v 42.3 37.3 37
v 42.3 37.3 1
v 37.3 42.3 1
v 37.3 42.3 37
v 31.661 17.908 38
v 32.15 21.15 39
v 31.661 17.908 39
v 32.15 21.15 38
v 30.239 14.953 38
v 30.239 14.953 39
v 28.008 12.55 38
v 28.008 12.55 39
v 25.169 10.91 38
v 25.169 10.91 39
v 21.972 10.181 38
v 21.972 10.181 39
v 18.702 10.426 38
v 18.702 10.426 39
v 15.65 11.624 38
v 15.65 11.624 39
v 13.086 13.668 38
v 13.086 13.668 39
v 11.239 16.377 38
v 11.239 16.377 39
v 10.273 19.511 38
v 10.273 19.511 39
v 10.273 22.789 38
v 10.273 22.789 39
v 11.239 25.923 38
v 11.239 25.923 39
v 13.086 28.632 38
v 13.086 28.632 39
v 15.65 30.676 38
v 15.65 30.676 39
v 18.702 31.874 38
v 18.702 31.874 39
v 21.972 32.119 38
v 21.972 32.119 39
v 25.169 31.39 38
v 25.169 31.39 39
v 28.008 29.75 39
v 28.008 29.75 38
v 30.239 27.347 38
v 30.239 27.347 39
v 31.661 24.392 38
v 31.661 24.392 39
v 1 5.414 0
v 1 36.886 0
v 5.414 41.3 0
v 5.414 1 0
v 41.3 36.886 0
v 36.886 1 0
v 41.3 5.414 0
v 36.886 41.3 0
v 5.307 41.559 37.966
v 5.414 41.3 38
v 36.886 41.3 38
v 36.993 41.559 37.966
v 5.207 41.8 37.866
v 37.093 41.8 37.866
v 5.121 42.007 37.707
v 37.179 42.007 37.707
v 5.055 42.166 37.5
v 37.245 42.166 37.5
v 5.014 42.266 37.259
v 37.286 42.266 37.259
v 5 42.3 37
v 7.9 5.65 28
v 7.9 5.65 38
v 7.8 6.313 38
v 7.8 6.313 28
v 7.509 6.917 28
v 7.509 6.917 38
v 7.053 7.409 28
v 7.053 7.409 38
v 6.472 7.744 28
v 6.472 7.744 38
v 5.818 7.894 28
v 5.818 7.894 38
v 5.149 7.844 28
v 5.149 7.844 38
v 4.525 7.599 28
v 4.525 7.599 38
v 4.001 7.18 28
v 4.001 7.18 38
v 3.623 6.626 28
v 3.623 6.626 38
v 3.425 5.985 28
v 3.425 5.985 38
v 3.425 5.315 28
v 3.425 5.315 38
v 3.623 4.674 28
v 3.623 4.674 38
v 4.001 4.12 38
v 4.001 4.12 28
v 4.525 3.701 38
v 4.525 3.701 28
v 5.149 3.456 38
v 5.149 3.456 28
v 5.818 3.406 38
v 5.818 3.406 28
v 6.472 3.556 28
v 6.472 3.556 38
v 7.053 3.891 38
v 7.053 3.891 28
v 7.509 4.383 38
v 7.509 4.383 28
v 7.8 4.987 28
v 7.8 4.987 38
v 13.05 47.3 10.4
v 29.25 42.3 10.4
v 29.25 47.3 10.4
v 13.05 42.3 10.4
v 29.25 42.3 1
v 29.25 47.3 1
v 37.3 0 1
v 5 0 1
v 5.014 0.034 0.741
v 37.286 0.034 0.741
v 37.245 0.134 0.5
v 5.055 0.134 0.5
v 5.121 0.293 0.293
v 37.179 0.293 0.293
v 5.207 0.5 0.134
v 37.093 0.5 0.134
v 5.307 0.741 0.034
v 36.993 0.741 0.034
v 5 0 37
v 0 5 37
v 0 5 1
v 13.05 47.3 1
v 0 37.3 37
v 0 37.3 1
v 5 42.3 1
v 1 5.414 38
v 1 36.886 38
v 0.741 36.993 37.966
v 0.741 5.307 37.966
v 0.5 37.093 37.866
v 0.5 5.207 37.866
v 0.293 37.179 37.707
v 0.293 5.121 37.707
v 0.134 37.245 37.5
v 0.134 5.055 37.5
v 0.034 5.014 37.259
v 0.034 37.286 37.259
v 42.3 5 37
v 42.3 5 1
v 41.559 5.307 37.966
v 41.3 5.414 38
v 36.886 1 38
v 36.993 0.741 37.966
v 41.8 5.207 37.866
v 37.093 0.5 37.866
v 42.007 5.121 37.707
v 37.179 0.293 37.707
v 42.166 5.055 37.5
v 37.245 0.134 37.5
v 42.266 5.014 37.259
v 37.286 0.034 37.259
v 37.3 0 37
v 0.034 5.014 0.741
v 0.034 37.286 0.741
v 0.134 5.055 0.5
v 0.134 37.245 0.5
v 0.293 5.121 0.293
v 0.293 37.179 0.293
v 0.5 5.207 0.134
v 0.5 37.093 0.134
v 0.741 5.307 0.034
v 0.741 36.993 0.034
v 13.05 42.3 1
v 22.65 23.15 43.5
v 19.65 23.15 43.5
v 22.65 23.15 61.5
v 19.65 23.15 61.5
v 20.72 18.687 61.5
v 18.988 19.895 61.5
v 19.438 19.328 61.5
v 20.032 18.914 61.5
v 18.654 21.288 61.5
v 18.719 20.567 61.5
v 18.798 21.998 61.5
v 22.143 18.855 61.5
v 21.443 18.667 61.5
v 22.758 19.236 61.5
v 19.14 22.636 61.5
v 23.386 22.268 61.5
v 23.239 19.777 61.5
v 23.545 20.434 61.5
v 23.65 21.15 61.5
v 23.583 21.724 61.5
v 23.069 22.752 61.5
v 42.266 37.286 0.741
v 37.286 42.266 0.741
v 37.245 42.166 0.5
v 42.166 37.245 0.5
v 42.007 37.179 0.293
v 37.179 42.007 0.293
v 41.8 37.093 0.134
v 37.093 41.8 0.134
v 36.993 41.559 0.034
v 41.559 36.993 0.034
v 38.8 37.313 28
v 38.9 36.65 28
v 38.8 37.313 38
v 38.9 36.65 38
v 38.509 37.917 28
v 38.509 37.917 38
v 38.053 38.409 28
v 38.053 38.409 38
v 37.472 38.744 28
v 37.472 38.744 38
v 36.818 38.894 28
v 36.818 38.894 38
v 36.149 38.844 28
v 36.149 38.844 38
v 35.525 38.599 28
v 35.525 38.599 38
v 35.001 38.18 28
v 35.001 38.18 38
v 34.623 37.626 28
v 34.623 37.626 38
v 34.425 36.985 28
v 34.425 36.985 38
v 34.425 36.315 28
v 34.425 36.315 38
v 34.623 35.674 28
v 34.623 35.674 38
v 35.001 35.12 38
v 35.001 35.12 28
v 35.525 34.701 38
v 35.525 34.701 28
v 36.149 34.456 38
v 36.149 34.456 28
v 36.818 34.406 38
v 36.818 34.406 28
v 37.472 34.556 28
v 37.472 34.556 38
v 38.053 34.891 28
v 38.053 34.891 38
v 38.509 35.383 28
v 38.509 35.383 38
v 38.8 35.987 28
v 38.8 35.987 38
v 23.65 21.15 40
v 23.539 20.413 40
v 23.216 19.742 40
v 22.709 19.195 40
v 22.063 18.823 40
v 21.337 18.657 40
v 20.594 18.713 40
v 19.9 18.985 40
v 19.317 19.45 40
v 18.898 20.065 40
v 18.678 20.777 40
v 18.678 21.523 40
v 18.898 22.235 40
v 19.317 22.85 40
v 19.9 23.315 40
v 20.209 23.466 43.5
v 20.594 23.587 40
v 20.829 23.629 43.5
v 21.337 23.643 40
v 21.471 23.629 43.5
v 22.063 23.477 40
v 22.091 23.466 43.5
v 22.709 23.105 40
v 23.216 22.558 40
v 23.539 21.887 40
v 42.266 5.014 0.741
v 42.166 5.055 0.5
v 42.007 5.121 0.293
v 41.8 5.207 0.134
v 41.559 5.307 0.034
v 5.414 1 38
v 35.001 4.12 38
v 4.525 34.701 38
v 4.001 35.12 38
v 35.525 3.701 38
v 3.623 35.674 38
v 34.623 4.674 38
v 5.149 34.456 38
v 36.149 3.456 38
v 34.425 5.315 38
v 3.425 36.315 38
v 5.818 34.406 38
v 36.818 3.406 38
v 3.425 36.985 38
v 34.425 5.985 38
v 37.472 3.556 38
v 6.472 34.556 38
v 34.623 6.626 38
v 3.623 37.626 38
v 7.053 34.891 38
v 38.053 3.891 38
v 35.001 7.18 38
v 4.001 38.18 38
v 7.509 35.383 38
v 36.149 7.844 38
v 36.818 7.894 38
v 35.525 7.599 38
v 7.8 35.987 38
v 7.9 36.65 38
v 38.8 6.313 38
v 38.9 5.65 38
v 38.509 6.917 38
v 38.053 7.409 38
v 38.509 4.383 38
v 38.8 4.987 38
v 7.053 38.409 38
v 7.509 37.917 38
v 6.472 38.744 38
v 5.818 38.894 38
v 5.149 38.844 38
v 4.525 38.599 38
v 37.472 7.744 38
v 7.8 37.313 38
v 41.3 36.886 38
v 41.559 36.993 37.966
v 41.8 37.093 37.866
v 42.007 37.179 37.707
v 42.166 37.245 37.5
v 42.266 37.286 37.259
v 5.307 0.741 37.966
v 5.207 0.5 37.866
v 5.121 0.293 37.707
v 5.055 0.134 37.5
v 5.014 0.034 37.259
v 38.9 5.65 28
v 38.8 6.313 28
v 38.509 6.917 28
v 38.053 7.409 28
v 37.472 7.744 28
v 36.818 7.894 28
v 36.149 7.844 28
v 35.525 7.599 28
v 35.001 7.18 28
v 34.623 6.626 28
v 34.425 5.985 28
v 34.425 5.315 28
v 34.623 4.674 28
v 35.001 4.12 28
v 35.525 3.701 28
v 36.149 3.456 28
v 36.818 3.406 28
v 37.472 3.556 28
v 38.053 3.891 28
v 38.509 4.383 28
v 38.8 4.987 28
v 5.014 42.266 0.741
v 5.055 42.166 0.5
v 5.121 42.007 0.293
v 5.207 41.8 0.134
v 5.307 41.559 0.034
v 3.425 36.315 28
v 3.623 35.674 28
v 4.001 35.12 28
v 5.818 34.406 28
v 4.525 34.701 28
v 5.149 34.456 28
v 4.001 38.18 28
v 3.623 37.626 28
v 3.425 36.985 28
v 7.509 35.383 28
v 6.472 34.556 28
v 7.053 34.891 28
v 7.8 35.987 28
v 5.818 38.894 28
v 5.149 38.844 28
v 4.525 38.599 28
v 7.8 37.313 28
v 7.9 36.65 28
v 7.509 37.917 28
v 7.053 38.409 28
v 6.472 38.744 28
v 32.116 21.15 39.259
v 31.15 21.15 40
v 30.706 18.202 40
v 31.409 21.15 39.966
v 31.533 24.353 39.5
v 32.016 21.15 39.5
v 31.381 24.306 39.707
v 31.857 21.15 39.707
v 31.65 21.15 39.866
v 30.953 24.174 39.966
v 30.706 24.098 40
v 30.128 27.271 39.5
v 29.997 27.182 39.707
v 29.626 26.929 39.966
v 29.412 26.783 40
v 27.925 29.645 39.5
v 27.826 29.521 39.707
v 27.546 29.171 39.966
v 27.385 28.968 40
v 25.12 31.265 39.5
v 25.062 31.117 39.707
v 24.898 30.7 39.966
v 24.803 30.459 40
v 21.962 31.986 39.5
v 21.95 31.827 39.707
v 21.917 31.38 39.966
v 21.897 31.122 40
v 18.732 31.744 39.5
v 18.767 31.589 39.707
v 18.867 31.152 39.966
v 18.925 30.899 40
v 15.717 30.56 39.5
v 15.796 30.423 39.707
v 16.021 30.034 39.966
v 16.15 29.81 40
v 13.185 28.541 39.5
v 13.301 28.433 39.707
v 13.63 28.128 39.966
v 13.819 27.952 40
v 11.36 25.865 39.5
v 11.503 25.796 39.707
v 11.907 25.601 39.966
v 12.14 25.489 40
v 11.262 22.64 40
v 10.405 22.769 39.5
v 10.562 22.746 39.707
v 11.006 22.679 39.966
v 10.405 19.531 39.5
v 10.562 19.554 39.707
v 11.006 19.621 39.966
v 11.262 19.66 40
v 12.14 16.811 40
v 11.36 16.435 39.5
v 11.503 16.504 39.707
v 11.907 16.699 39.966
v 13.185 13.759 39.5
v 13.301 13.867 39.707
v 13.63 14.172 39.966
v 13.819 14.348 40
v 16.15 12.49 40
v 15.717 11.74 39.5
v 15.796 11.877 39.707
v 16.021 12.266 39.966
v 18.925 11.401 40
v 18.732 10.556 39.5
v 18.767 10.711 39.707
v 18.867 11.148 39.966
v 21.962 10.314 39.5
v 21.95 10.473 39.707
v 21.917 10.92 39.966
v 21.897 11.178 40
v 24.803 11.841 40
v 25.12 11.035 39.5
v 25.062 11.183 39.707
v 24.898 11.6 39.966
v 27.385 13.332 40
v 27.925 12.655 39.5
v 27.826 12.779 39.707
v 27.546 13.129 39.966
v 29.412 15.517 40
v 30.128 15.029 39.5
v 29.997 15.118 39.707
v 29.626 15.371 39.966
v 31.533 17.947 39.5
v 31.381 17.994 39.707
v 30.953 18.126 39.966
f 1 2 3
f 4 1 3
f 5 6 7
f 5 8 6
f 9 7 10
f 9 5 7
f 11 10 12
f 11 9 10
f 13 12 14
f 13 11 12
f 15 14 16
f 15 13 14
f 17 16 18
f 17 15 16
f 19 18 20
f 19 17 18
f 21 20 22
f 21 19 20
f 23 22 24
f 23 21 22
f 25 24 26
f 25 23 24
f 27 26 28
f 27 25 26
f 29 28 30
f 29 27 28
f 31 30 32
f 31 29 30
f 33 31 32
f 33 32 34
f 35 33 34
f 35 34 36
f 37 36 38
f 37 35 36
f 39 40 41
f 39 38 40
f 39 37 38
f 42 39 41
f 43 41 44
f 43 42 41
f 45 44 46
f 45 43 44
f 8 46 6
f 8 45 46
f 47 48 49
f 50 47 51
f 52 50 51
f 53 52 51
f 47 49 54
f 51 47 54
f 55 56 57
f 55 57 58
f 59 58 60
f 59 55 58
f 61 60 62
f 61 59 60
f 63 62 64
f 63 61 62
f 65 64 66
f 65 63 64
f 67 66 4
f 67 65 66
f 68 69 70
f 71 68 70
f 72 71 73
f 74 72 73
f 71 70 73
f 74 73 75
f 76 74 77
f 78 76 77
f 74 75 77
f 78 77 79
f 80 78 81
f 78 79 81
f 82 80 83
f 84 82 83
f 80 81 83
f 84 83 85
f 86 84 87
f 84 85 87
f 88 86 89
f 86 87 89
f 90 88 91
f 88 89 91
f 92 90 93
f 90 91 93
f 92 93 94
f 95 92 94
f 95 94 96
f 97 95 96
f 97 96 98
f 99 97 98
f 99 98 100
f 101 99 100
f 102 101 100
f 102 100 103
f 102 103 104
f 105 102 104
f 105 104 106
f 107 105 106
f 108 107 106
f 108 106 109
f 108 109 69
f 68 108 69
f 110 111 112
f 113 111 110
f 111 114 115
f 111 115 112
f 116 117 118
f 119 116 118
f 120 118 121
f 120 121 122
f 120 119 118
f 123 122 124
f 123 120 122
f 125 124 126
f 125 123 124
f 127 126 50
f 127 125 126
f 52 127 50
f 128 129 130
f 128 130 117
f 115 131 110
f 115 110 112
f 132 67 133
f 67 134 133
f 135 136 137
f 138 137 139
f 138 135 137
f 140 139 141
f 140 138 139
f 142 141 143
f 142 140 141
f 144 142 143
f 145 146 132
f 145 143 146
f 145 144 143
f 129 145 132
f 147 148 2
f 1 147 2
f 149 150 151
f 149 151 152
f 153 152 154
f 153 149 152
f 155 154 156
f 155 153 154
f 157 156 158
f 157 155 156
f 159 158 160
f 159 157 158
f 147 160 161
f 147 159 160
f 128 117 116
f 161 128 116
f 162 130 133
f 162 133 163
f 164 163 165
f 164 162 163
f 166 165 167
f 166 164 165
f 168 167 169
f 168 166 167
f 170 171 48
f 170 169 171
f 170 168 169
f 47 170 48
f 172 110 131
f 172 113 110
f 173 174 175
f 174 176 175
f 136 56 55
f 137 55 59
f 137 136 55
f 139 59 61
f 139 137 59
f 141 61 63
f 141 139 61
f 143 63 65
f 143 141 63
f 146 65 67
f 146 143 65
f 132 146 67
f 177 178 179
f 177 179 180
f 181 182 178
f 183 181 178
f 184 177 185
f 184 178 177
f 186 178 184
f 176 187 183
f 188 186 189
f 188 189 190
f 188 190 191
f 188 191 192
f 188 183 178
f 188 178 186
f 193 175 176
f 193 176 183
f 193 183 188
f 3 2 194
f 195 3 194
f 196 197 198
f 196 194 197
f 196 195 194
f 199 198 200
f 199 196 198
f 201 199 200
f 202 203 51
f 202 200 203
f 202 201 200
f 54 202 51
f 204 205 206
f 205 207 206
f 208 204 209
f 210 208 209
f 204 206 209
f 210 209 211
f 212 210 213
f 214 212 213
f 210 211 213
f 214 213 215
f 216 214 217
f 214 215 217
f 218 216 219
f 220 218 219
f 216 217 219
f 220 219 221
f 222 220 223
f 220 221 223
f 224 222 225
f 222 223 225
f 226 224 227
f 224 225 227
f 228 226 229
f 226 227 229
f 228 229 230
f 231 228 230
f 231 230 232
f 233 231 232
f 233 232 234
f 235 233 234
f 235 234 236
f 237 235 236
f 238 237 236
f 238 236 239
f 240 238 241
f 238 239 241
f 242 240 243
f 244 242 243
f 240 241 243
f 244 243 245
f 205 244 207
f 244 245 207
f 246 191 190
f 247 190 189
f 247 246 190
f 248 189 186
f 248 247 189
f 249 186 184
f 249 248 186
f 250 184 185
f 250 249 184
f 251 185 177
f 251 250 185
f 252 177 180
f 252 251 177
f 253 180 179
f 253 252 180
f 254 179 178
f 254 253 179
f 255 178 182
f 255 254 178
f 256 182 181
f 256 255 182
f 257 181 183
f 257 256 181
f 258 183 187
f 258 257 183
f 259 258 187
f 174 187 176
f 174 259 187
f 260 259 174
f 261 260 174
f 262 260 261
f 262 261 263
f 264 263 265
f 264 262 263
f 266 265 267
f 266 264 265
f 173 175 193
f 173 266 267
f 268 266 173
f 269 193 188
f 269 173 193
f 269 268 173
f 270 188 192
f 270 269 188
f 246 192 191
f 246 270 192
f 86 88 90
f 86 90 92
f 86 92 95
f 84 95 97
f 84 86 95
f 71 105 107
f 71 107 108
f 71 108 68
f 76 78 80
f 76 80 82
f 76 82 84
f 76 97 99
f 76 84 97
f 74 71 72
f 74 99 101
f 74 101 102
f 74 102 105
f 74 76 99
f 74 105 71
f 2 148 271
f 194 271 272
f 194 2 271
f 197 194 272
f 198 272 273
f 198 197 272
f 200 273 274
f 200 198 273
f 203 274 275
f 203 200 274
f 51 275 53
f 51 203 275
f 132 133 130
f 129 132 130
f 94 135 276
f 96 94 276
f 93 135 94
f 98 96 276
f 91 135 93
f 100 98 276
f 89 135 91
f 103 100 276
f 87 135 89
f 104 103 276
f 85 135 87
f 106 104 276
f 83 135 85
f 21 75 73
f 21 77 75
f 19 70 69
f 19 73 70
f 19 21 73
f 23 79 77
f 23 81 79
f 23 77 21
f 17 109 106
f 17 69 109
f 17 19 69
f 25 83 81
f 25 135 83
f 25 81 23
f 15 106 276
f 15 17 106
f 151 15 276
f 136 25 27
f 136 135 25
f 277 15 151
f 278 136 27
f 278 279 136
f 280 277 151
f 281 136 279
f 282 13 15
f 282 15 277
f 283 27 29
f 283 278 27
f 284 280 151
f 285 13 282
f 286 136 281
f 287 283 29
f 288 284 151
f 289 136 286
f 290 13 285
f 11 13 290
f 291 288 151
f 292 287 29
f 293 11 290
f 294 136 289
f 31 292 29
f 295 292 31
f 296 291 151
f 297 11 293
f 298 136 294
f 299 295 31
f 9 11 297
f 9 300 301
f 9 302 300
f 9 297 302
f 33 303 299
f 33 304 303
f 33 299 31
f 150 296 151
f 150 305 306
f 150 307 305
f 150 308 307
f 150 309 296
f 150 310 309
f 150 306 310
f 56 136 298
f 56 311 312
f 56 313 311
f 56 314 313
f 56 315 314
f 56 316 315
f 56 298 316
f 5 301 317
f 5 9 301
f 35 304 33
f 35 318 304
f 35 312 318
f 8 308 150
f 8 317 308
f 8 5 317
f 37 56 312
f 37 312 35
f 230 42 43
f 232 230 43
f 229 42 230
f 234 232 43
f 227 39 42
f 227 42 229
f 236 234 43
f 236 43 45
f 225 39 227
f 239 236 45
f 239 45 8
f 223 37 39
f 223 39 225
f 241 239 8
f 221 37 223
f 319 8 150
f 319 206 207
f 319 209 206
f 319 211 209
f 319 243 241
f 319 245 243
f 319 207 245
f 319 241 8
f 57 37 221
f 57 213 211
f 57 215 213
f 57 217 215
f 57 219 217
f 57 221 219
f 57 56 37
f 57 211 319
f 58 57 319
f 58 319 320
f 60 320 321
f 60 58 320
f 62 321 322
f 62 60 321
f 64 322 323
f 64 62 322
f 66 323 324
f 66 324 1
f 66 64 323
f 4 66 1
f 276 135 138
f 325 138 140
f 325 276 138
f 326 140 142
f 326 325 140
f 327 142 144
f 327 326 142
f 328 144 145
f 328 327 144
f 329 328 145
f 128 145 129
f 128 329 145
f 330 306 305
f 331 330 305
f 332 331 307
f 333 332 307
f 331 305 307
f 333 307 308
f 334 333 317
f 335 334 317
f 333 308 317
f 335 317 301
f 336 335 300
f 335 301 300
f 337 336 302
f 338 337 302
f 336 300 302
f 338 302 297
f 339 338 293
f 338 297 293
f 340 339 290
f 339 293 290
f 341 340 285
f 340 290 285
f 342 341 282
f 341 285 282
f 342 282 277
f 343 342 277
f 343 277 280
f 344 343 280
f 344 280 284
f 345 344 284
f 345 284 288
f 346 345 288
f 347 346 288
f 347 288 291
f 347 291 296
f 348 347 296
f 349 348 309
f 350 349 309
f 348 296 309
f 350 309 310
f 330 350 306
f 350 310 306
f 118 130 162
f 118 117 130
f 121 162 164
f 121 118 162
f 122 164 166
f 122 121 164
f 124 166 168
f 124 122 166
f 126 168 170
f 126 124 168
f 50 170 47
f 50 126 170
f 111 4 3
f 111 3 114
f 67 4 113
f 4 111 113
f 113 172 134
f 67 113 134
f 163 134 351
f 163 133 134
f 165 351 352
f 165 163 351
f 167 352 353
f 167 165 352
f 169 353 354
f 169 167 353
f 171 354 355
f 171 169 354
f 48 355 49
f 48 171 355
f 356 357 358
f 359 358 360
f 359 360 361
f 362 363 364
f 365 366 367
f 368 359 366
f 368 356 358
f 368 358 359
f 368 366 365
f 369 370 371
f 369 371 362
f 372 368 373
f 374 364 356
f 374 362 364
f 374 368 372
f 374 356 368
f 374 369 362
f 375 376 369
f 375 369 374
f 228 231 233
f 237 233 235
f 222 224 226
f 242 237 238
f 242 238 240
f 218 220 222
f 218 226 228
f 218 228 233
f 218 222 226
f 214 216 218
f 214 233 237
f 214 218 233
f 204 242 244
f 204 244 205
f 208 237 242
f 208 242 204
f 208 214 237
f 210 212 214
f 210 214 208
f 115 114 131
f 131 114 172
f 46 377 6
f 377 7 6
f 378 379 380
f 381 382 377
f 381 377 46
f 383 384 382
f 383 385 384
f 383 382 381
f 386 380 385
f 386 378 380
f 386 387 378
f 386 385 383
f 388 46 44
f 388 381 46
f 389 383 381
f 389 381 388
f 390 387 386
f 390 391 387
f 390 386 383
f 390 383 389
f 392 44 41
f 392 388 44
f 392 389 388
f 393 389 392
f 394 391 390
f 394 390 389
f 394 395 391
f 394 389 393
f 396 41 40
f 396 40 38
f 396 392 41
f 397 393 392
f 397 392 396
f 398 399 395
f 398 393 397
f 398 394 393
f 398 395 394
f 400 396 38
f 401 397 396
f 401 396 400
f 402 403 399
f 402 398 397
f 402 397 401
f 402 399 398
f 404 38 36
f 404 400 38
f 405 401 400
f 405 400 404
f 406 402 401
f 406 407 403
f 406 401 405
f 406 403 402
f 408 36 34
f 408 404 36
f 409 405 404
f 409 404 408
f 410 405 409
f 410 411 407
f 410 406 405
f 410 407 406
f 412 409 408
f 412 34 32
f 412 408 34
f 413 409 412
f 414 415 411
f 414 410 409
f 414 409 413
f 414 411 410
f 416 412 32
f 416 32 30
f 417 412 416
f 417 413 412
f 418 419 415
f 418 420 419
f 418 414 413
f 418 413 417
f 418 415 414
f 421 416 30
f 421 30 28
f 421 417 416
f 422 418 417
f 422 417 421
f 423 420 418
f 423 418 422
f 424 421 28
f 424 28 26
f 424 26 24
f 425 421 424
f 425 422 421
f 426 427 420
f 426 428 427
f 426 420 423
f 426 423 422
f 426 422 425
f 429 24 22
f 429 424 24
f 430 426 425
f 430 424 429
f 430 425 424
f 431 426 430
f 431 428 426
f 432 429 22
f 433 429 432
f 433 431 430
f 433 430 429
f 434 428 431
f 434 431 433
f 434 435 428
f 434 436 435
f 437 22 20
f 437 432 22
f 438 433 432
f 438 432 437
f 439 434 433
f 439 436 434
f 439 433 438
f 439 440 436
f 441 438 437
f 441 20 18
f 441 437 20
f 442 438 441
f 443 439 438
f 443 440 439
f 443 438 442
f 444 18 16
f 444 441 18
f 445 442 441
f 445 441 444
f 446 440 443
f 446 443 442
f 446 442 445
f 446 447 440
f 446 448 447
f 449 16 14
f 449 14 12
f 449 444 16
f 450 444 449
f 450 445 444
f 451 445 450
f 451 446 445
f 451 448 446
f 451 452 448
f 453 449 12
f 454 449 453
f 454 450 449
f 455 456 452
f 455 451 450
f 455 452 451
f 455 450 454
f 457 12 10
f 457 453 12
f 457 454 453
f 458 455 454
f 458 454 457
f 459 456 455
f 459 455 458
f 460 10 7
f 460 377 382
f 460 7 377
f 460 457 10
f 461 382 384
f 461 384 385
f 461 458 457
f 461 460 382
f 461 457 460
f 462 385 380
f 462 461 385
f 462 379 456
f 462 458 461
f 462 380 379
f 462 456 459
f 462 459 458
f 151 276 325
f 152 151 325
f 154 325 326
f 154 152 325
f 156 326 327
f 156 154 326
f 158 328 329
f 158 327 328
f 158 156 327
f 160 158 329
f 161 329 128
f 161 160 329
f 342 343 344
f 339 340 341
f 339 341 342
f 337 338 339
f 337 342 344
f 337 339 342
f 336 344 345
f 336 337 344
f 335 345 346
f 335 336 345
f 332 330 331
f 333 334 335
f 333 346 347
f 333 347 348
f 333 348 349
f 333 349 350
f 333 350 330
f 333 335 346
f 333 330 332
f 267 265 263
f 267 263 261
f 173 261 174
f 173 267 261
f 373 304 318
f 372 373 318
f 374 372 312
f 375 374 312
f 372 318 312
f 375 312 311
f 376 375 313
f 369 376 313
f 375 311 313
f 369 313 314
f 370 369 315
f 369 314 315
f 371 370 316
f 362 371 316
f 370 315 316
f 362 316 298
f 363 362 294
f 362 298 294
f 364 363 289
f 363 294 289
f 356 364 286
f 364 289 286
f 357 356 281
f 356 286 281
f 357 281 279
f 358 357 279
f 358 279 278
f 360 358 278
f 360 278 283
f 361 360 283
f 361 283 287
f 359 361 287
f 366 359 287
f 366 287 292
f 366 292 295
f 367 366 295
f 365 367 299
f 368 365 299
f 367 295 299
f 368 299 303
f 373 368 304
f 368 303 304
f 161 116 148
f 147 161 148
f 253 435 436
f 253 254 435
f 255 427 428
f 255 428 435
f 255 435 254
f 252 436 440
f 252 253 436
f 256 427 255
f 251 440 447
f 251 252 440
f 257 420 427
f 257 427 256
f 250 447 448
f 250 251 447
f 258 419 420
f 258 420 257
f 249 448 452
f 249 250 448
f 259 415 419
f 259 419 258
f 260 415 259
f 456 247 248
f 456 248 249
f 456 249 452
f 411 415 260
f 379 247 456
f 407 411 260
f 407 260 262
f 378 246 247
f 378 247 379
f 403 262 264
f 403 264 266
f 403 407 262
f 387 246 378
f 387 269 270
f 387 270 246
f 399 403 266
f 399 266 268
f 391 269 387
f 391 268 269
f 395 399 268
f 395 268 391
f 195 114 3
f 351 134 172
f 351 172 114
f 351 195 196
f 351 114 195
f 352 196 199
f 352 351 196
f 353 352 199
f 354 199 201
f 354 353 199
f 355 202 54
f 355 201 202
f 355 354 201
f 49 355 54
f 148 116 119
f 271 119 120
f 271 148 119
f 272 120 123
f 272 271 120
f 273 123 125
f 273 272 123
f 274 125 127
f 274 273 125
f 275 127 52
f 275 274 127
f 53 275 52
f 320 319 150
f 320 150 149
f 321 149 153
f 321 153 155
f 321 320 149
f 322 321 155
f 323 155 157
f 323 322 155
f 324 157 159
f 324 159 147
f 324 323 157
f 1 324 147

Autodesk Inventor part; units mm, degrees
ref_plane "YZ Plane" through (0, 0, 0) normal (1, 0, 0) x (0, 1, 0)
ref_plane "XZ Plane" through (0, 0, 0) normal (0, 1, 0) x (-1, 0, 0)
ref_plane "XY Plane" through (0, 0, 0) normal (0, 0, 1) x (1, 0, 0)
sketch "Sketch1" plane through (0, 0, 0) normal (0, 0, 1) x (1, 0, 0)
  line L0 (5, 0) -> (37.3, 0)
  line L1 (42.3, 5) -> (42.3, 37.3)
  line L2 (37.3, 42.3) -> (5, 42.3)
  line L3 (0, 37.3) -> (0, 5)
  line L4 (5, 42.3) -> (0, 37.3)
  line L5 (42.3, 37.3) -> (37.3, 42.3)
  line L6 (37.3, 0) -> (42.3, 5)
  line L7 (0, 5) -> (5, 0)
  point P0 (0, 0)
  point P1 (42.3, 42.3)
  point P2 (42.3, 0)
  point P3 (0, 42.3)
  dimension "d0" = 42.3
  dimension "d1" = 42.3
  dimension "d2" = 5
  dimension "d3" = 5
  dimension "d4" = 5
  dimension "d5" = 5
  dimension "d6" = 5
  dimension "d7" = 5
  dimension "d8" = 5
  dimension "d9" = 5
extrude "Extrusion1" add sketch "Sketch1" along normal blind 38
sketch "Sketch2" plane through (0, 0, 38) normal (0, 0, 1) x (1, 0, 0)
  line L0 (5.65, 36.65) -> (36.65, 36.65) construction
  line L1 (36.65, 36.65) -> (36.65, 5.65) construction
  line L2 (36.65, 5.65) -> (5.65, 5.65) construction
  line L3 (5.65, 5.65) -> (5.65, 36.65) construction
  line L4 (0, 37.3) -> (0, 5) projected
  line L5 (37.3, 42.3) -> (5, 42.3) projected
  circle A0 centre (5.65, 36.65) radius 2.25
  circle A1 centre (36.65, 36.65) radius 2.25
  circle A2 centre (36.65, 5.65) radius 2.25
  circle A3 centre (5.65, 5.65) radius 2.25
  point P0 (0, 0)
  point P1 (5.65, 21.15)
  point P2 (0, 21.15)
  point P3 (21.15, 36.65)
  point P4 (21.15, 42.3)
  dimension "d12" = 31
  dimension "d13" = 4.5
extrude "Extrusion2" cut sketch "Sketch2" against normal blind 10
sketch "Sketch3" plane through (0, 0, 38) normal (0, 0, 1) x (1, 0, 0)
  circle A0 centre (21.15, 21.15) radius 11
  line L0 (37.3, 42.3) -> (5, 42.3) projected
  line L1 (42.3, 5) -> (42.3, 37.3) projected
  point P0 (0, 0)
  point P1 (21.15, 42.3)
  point P2 (42.3, 21.15)
  dimension "d16" = 22
extrude "Extrusion3" add sketch "Sketch3" along normal blind 2
fillet "Fillet1" radius 1 17 edges at (10.15, 21.15, 40) (21.15, 42.3, 38) (39.8, 39.8, 38) (42.3, 21.15, 38) (39.8, 2.5, 38) (21.15, 0, 38) (2.5, 2.5, 38) (0, 21.15, 38) (2.5, 39.8, 38) (21.15, 42.3, 0) (2.5, 39.8, 0) (39.8, 39.8, 0) (42.3, 21.15, 0) (39.8, 2.5, 0) (21.15, 0, 0) (0, 21.15, 0) (2.5, 2.5, 0)
sketch "Sketch4" plane through (0, 0, 38) normal (0, 0, 1) x (1, 0, 0)
  circle A0 centre (21.15, 21.15) radius 10 projected
  circle A1 centre (21.15, 21.15) radius 2.5
  point P0 (0, 0)
  dimension "d20" = 5
extrude "Extrusion4" add sketch "Sketch4" along normal blind 23.5 contours A1
sketch "Sketch5" plane through (21.15, 21.15, 61.5) normal (0, 0, 1) x (1, 0, 0)
  circle A0 centre (0, 0) radius 2.5 projected
  line L0 (-1.5, 2) -> (1.5, 2)
  circle A1 centre (0, 0) radius 2.5 projected
  point P0 (-21.15, -21.15)
  point P1 (1.5, 2)
  dimension "d23" = 2
extrude "Extrusion5" cut sketch "Sketch5" against normal blind 18 contours L0 A0 picked at (-0.3466, 2.0912)
sketch "Sketch6" plane through (5, 42.3, 1) normal (0, 1, 0) x (1, 0, 0)
  line L0 (32.3, 0) -> (0, 0) projected
  line L1 (8.05, 0) -> (24.25, 0)
  line L2 (24.25, 0) -> (24.25, -9.4)
  line L3 (24.25, -9.4) -> (8.05, -9.4)
  line L4 (8.05, -9.4) -> (8.05, 0)
  point P0 (-5, 1)
  point P1 (16.15, 0)
  point P2 (24.25, 0)
  dimension "d26" = 16.2
  dimension "d27" = 9.4
extrude "Extrusion6" add sketch "Sketch6" along normal blind 5
equation "\"d3\" = d2"
equation "\"d4\" = d2"
equation "\"d5\" = d4"
equation "\"d6\" = d2"
equation "\"d7\" = d6"
equation "\"d8\" = d2"
equation "\"d9\" = d8"
properties part number "Motor Model"
